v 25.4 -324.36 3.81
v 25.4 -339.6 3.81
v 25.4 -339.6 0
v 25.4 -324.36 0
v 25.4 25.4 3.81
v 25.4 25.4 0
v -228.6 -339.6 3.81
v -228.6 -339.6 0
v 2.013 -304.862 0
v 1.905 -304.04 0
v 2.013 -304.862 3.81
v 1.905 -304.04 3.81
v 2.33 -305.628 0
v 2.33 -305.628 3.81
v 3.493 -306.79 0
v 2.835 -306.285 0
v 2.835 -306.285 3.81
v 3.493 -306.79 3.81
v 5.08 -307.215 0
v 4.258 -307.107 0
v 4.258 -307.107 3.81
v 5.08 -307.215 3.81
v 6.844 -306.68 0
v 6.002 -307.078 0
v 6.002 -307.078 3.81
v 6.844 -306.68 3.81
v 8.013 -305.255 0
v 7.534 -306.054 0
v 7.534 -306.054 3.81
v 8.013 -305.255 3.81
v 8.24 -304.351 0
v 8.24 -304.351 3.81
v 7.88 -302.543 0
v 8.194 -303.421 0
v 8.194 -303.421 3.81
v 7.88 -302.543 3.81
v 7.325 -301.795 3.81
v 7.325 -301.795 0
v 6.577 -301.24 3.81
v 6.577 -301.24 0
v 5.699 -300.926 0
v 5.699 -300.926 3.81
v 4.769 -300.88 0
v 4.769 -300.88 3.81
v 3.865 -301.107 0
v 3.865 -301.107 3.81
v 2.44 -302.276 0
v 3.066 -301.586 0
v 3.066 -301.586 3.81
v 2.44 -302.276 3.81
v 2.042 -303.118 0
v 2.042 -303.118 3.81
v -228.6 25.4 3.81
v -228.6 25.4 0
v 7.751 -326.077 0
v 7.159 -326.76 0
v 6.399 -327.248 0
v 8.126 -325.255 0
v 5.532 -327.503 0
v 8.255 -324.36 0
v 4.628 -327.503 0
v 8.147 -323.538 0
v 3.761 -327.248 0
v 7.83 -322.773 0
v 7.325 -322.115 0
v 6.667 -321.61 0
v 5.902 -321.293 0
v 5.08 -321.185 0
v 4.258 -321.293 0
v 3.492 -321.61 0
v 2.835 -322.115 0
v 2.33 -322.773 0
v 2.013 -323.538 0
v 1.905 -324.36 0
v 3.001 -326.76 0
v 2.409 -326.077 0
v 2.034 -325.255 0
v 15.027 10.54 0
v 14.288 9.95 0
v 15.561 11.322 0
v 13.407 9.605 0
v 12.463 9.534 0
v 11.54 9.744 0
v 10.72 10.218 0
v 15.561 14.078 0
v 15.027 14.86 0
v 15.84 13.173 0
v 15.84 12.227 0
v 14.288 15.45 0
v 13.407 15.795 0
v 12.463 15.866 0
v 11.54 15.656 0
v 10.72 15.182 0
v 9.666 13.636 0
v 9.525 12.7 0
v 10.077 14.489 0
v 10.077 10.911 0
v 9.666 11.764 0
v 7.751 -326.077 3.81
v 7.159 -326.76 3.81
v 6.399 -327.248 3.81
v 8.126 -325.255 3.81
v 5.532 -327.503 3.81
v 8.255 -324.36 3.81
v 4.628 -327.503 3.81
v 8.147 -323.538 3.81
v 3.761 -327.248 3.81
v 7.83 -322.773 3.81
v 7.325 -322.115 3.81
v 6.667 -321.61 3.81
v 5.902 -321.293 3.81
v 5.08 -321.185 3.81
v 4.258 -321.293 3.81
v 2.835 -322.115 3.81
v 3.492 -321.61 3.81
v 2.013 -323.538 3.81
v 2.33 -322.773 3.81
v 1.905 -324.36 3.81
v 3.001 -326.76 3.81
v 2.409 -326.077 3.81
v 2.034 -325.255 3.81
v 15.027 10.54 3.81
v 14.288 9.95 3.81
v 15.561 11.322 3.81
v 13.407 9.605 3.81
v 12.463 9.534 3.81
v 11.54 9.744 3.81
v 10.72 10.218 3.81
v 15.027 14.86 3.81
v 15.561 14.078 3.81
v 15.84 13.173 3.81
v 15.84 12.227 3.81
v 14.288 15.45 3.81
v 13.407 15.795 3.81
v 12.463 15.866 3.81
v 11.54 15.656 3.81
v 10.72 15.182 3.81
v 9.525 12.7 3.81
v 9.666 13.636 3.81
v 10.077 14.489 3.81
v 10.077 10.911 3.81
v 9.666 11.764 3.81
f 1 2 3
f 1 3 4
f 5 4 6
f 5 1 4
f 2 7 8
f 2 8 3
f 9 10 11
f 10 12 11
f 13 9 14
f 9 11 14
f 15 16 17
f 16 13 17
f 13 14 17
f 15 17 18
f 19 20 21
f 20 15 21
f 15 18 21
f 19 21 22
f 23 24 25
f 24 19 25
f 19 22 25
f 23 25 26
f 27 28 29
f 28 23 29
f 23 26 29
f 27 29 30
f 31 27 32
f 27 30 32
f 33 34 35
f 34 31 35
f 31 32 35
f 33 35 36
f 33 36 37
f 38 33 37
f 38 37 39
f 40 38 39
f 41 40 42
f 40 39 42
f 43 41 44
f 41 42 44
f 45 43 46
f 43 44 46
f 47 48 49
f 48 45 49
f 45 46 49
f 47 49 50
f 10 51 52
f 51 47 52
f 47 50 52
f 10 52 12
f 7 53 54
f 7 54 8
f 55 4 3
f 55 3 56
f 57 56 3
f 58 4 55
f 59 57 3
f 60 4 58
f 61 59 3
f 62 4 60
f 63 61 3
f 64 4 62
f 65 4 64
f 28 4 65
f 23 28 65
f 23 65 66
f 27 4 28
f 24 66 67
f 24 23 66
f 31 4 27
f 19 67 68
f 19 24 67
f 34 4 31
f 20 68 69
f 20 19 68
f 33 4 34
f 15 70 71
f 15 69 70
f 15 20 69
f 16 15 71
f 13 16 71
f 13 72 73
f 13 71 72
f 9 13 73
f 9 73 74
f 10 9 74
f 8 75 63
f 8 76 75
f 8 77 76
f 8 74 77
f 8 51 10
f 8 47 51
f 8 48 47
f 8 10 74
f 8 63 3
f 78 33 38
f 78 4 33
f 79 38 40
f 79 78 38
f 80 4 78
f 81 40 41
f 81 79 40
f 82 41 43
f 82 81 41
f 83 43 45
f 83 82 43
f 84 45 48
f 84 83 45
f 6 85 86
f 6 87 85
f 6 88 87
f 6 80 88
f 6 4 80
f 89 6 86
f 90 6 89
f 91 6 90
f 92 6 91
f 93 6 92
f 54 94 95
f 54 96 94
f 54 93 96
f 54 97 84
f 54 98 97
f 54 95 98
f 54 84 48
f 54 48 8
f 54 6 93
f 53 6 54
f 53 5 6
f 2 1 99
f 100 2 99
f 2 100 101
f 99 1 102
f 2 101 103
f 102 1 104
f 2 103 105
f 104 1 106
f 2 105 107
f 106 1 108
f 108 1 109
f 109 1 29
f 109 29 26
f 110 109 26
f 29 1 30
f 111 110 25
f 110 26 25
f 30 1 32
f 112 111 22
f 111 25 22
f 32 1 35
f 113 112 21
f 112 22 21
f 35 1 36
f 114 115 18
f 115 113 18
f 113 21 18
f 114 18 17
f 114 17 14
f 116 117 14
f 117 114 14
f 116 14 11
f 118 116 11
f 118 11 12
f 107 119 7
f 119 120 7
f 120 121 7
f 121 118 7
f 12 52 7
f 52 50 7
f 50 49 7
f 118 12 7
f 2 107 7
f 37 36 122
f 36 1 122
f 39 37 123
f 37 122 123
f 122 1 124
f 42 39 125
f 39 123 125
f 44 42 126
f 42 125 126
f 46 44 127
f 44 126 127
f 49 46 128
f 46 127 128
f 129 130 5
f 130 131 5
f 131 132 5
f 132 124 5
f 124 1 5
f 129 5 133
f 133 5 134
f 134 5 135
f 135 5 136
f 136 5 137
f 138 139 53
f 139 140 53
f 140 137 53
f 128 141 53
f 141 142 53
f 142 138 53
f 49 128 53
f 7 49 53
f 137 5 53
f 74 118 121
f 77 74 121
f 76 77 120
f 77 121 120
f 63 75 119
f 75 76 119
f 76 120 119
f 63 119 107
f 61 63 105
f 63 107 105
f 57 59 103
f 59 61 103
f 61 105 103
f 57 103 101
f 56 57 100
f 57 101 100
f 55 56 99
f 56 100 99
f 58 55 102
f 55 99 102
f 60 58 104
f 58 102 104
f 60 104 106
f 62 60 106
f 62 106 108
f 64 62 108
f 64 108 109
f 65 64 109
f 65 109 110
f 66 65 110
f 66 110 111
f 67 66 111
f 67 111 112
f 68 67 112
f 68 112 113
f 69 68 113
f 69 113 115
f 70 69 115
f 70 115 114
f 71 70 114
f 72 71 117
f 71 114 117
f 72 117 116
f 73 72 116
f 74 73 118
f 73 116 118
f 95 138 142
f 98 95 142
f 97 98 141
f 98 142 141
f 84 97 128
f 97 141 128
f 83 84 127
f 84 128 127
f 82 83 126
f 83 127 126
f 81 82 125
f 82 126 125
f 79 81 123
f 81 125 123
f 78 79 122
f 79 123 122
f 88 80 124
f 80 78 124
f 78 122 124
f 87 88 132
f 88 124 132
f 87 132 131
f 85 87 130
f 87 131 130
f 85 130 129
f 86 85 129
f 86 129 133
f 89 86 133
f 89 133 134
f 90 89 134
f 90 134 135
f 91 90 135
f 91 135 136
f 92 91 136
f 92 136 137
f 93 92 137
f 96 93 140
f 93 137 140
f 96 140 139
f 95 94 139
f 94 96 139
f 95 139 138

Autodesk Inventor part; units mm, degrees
ref_plane "YZ Plane" through (0, 0, 0) normal (1, 0, 0) x (0, 1, 0)
ref_plane "XZ Plane" through (0, 0, 0) normal (0, 1, 0) x (-1, 0, 0)
ref_plane "Work Plane1" through (25.4, 0, 3.81) normal (0, 0, -1) x (-1, 0, 0)
sketch "Sketch1" plane through (25.4, 0, 3.81) normal (0, 0, -1) x (-1, 0, 0)
  circle A0 centre (12.7, 12.7) radius 3.175 projected
  line L0 (0, 0) -> (25.4895, 0) projected
  line L1 (25.4895, 25.4) -> (25.4895, 0) projected
  line L2 (0, 25.4) -> (25.4895, 25.4) projected
  line L3 (0, 0) -> (0, 25.4) projected
  line L4 (0, 25.4) -> (254, 25.4)
  line L5 (254, 25.4) -> (254, -339.6)
  line L6 (254, -339.6) -> (0, -339.6)
  line L7 (0, -339.6) -> (0, 25.4)
  line L8 (0, -339.6) -> (0, -324.36)
  line L9 (0, -324.36) -> (20.32, -324.36)
  line L10 (20.32, -324.36) -> (20.32, -304.04)
  circle A1 centre (20.32, -324.36) radius 3.175
  circle A2 centre (20.32, -304.04) radius 3.175
  point P0 (25.4, 0)
  dimension "d0" = 254
  dimension "d1" = 365
  dimension "d2" = 15.24
  dimension "d3" = 20.32
  dimension "d4" = 20.32
  dimension "d5" = 6.35
  dimension "d6" = 6.35
ref_plane "Work Plane2" through (0, -340.36, 0) normal (0, 0, 1) x (1, 0, 0)
extrude "Extrusion1" add sketch "Sketch1" along normal up to surface (3.81 mm away)
properties part number "Side Panel"
